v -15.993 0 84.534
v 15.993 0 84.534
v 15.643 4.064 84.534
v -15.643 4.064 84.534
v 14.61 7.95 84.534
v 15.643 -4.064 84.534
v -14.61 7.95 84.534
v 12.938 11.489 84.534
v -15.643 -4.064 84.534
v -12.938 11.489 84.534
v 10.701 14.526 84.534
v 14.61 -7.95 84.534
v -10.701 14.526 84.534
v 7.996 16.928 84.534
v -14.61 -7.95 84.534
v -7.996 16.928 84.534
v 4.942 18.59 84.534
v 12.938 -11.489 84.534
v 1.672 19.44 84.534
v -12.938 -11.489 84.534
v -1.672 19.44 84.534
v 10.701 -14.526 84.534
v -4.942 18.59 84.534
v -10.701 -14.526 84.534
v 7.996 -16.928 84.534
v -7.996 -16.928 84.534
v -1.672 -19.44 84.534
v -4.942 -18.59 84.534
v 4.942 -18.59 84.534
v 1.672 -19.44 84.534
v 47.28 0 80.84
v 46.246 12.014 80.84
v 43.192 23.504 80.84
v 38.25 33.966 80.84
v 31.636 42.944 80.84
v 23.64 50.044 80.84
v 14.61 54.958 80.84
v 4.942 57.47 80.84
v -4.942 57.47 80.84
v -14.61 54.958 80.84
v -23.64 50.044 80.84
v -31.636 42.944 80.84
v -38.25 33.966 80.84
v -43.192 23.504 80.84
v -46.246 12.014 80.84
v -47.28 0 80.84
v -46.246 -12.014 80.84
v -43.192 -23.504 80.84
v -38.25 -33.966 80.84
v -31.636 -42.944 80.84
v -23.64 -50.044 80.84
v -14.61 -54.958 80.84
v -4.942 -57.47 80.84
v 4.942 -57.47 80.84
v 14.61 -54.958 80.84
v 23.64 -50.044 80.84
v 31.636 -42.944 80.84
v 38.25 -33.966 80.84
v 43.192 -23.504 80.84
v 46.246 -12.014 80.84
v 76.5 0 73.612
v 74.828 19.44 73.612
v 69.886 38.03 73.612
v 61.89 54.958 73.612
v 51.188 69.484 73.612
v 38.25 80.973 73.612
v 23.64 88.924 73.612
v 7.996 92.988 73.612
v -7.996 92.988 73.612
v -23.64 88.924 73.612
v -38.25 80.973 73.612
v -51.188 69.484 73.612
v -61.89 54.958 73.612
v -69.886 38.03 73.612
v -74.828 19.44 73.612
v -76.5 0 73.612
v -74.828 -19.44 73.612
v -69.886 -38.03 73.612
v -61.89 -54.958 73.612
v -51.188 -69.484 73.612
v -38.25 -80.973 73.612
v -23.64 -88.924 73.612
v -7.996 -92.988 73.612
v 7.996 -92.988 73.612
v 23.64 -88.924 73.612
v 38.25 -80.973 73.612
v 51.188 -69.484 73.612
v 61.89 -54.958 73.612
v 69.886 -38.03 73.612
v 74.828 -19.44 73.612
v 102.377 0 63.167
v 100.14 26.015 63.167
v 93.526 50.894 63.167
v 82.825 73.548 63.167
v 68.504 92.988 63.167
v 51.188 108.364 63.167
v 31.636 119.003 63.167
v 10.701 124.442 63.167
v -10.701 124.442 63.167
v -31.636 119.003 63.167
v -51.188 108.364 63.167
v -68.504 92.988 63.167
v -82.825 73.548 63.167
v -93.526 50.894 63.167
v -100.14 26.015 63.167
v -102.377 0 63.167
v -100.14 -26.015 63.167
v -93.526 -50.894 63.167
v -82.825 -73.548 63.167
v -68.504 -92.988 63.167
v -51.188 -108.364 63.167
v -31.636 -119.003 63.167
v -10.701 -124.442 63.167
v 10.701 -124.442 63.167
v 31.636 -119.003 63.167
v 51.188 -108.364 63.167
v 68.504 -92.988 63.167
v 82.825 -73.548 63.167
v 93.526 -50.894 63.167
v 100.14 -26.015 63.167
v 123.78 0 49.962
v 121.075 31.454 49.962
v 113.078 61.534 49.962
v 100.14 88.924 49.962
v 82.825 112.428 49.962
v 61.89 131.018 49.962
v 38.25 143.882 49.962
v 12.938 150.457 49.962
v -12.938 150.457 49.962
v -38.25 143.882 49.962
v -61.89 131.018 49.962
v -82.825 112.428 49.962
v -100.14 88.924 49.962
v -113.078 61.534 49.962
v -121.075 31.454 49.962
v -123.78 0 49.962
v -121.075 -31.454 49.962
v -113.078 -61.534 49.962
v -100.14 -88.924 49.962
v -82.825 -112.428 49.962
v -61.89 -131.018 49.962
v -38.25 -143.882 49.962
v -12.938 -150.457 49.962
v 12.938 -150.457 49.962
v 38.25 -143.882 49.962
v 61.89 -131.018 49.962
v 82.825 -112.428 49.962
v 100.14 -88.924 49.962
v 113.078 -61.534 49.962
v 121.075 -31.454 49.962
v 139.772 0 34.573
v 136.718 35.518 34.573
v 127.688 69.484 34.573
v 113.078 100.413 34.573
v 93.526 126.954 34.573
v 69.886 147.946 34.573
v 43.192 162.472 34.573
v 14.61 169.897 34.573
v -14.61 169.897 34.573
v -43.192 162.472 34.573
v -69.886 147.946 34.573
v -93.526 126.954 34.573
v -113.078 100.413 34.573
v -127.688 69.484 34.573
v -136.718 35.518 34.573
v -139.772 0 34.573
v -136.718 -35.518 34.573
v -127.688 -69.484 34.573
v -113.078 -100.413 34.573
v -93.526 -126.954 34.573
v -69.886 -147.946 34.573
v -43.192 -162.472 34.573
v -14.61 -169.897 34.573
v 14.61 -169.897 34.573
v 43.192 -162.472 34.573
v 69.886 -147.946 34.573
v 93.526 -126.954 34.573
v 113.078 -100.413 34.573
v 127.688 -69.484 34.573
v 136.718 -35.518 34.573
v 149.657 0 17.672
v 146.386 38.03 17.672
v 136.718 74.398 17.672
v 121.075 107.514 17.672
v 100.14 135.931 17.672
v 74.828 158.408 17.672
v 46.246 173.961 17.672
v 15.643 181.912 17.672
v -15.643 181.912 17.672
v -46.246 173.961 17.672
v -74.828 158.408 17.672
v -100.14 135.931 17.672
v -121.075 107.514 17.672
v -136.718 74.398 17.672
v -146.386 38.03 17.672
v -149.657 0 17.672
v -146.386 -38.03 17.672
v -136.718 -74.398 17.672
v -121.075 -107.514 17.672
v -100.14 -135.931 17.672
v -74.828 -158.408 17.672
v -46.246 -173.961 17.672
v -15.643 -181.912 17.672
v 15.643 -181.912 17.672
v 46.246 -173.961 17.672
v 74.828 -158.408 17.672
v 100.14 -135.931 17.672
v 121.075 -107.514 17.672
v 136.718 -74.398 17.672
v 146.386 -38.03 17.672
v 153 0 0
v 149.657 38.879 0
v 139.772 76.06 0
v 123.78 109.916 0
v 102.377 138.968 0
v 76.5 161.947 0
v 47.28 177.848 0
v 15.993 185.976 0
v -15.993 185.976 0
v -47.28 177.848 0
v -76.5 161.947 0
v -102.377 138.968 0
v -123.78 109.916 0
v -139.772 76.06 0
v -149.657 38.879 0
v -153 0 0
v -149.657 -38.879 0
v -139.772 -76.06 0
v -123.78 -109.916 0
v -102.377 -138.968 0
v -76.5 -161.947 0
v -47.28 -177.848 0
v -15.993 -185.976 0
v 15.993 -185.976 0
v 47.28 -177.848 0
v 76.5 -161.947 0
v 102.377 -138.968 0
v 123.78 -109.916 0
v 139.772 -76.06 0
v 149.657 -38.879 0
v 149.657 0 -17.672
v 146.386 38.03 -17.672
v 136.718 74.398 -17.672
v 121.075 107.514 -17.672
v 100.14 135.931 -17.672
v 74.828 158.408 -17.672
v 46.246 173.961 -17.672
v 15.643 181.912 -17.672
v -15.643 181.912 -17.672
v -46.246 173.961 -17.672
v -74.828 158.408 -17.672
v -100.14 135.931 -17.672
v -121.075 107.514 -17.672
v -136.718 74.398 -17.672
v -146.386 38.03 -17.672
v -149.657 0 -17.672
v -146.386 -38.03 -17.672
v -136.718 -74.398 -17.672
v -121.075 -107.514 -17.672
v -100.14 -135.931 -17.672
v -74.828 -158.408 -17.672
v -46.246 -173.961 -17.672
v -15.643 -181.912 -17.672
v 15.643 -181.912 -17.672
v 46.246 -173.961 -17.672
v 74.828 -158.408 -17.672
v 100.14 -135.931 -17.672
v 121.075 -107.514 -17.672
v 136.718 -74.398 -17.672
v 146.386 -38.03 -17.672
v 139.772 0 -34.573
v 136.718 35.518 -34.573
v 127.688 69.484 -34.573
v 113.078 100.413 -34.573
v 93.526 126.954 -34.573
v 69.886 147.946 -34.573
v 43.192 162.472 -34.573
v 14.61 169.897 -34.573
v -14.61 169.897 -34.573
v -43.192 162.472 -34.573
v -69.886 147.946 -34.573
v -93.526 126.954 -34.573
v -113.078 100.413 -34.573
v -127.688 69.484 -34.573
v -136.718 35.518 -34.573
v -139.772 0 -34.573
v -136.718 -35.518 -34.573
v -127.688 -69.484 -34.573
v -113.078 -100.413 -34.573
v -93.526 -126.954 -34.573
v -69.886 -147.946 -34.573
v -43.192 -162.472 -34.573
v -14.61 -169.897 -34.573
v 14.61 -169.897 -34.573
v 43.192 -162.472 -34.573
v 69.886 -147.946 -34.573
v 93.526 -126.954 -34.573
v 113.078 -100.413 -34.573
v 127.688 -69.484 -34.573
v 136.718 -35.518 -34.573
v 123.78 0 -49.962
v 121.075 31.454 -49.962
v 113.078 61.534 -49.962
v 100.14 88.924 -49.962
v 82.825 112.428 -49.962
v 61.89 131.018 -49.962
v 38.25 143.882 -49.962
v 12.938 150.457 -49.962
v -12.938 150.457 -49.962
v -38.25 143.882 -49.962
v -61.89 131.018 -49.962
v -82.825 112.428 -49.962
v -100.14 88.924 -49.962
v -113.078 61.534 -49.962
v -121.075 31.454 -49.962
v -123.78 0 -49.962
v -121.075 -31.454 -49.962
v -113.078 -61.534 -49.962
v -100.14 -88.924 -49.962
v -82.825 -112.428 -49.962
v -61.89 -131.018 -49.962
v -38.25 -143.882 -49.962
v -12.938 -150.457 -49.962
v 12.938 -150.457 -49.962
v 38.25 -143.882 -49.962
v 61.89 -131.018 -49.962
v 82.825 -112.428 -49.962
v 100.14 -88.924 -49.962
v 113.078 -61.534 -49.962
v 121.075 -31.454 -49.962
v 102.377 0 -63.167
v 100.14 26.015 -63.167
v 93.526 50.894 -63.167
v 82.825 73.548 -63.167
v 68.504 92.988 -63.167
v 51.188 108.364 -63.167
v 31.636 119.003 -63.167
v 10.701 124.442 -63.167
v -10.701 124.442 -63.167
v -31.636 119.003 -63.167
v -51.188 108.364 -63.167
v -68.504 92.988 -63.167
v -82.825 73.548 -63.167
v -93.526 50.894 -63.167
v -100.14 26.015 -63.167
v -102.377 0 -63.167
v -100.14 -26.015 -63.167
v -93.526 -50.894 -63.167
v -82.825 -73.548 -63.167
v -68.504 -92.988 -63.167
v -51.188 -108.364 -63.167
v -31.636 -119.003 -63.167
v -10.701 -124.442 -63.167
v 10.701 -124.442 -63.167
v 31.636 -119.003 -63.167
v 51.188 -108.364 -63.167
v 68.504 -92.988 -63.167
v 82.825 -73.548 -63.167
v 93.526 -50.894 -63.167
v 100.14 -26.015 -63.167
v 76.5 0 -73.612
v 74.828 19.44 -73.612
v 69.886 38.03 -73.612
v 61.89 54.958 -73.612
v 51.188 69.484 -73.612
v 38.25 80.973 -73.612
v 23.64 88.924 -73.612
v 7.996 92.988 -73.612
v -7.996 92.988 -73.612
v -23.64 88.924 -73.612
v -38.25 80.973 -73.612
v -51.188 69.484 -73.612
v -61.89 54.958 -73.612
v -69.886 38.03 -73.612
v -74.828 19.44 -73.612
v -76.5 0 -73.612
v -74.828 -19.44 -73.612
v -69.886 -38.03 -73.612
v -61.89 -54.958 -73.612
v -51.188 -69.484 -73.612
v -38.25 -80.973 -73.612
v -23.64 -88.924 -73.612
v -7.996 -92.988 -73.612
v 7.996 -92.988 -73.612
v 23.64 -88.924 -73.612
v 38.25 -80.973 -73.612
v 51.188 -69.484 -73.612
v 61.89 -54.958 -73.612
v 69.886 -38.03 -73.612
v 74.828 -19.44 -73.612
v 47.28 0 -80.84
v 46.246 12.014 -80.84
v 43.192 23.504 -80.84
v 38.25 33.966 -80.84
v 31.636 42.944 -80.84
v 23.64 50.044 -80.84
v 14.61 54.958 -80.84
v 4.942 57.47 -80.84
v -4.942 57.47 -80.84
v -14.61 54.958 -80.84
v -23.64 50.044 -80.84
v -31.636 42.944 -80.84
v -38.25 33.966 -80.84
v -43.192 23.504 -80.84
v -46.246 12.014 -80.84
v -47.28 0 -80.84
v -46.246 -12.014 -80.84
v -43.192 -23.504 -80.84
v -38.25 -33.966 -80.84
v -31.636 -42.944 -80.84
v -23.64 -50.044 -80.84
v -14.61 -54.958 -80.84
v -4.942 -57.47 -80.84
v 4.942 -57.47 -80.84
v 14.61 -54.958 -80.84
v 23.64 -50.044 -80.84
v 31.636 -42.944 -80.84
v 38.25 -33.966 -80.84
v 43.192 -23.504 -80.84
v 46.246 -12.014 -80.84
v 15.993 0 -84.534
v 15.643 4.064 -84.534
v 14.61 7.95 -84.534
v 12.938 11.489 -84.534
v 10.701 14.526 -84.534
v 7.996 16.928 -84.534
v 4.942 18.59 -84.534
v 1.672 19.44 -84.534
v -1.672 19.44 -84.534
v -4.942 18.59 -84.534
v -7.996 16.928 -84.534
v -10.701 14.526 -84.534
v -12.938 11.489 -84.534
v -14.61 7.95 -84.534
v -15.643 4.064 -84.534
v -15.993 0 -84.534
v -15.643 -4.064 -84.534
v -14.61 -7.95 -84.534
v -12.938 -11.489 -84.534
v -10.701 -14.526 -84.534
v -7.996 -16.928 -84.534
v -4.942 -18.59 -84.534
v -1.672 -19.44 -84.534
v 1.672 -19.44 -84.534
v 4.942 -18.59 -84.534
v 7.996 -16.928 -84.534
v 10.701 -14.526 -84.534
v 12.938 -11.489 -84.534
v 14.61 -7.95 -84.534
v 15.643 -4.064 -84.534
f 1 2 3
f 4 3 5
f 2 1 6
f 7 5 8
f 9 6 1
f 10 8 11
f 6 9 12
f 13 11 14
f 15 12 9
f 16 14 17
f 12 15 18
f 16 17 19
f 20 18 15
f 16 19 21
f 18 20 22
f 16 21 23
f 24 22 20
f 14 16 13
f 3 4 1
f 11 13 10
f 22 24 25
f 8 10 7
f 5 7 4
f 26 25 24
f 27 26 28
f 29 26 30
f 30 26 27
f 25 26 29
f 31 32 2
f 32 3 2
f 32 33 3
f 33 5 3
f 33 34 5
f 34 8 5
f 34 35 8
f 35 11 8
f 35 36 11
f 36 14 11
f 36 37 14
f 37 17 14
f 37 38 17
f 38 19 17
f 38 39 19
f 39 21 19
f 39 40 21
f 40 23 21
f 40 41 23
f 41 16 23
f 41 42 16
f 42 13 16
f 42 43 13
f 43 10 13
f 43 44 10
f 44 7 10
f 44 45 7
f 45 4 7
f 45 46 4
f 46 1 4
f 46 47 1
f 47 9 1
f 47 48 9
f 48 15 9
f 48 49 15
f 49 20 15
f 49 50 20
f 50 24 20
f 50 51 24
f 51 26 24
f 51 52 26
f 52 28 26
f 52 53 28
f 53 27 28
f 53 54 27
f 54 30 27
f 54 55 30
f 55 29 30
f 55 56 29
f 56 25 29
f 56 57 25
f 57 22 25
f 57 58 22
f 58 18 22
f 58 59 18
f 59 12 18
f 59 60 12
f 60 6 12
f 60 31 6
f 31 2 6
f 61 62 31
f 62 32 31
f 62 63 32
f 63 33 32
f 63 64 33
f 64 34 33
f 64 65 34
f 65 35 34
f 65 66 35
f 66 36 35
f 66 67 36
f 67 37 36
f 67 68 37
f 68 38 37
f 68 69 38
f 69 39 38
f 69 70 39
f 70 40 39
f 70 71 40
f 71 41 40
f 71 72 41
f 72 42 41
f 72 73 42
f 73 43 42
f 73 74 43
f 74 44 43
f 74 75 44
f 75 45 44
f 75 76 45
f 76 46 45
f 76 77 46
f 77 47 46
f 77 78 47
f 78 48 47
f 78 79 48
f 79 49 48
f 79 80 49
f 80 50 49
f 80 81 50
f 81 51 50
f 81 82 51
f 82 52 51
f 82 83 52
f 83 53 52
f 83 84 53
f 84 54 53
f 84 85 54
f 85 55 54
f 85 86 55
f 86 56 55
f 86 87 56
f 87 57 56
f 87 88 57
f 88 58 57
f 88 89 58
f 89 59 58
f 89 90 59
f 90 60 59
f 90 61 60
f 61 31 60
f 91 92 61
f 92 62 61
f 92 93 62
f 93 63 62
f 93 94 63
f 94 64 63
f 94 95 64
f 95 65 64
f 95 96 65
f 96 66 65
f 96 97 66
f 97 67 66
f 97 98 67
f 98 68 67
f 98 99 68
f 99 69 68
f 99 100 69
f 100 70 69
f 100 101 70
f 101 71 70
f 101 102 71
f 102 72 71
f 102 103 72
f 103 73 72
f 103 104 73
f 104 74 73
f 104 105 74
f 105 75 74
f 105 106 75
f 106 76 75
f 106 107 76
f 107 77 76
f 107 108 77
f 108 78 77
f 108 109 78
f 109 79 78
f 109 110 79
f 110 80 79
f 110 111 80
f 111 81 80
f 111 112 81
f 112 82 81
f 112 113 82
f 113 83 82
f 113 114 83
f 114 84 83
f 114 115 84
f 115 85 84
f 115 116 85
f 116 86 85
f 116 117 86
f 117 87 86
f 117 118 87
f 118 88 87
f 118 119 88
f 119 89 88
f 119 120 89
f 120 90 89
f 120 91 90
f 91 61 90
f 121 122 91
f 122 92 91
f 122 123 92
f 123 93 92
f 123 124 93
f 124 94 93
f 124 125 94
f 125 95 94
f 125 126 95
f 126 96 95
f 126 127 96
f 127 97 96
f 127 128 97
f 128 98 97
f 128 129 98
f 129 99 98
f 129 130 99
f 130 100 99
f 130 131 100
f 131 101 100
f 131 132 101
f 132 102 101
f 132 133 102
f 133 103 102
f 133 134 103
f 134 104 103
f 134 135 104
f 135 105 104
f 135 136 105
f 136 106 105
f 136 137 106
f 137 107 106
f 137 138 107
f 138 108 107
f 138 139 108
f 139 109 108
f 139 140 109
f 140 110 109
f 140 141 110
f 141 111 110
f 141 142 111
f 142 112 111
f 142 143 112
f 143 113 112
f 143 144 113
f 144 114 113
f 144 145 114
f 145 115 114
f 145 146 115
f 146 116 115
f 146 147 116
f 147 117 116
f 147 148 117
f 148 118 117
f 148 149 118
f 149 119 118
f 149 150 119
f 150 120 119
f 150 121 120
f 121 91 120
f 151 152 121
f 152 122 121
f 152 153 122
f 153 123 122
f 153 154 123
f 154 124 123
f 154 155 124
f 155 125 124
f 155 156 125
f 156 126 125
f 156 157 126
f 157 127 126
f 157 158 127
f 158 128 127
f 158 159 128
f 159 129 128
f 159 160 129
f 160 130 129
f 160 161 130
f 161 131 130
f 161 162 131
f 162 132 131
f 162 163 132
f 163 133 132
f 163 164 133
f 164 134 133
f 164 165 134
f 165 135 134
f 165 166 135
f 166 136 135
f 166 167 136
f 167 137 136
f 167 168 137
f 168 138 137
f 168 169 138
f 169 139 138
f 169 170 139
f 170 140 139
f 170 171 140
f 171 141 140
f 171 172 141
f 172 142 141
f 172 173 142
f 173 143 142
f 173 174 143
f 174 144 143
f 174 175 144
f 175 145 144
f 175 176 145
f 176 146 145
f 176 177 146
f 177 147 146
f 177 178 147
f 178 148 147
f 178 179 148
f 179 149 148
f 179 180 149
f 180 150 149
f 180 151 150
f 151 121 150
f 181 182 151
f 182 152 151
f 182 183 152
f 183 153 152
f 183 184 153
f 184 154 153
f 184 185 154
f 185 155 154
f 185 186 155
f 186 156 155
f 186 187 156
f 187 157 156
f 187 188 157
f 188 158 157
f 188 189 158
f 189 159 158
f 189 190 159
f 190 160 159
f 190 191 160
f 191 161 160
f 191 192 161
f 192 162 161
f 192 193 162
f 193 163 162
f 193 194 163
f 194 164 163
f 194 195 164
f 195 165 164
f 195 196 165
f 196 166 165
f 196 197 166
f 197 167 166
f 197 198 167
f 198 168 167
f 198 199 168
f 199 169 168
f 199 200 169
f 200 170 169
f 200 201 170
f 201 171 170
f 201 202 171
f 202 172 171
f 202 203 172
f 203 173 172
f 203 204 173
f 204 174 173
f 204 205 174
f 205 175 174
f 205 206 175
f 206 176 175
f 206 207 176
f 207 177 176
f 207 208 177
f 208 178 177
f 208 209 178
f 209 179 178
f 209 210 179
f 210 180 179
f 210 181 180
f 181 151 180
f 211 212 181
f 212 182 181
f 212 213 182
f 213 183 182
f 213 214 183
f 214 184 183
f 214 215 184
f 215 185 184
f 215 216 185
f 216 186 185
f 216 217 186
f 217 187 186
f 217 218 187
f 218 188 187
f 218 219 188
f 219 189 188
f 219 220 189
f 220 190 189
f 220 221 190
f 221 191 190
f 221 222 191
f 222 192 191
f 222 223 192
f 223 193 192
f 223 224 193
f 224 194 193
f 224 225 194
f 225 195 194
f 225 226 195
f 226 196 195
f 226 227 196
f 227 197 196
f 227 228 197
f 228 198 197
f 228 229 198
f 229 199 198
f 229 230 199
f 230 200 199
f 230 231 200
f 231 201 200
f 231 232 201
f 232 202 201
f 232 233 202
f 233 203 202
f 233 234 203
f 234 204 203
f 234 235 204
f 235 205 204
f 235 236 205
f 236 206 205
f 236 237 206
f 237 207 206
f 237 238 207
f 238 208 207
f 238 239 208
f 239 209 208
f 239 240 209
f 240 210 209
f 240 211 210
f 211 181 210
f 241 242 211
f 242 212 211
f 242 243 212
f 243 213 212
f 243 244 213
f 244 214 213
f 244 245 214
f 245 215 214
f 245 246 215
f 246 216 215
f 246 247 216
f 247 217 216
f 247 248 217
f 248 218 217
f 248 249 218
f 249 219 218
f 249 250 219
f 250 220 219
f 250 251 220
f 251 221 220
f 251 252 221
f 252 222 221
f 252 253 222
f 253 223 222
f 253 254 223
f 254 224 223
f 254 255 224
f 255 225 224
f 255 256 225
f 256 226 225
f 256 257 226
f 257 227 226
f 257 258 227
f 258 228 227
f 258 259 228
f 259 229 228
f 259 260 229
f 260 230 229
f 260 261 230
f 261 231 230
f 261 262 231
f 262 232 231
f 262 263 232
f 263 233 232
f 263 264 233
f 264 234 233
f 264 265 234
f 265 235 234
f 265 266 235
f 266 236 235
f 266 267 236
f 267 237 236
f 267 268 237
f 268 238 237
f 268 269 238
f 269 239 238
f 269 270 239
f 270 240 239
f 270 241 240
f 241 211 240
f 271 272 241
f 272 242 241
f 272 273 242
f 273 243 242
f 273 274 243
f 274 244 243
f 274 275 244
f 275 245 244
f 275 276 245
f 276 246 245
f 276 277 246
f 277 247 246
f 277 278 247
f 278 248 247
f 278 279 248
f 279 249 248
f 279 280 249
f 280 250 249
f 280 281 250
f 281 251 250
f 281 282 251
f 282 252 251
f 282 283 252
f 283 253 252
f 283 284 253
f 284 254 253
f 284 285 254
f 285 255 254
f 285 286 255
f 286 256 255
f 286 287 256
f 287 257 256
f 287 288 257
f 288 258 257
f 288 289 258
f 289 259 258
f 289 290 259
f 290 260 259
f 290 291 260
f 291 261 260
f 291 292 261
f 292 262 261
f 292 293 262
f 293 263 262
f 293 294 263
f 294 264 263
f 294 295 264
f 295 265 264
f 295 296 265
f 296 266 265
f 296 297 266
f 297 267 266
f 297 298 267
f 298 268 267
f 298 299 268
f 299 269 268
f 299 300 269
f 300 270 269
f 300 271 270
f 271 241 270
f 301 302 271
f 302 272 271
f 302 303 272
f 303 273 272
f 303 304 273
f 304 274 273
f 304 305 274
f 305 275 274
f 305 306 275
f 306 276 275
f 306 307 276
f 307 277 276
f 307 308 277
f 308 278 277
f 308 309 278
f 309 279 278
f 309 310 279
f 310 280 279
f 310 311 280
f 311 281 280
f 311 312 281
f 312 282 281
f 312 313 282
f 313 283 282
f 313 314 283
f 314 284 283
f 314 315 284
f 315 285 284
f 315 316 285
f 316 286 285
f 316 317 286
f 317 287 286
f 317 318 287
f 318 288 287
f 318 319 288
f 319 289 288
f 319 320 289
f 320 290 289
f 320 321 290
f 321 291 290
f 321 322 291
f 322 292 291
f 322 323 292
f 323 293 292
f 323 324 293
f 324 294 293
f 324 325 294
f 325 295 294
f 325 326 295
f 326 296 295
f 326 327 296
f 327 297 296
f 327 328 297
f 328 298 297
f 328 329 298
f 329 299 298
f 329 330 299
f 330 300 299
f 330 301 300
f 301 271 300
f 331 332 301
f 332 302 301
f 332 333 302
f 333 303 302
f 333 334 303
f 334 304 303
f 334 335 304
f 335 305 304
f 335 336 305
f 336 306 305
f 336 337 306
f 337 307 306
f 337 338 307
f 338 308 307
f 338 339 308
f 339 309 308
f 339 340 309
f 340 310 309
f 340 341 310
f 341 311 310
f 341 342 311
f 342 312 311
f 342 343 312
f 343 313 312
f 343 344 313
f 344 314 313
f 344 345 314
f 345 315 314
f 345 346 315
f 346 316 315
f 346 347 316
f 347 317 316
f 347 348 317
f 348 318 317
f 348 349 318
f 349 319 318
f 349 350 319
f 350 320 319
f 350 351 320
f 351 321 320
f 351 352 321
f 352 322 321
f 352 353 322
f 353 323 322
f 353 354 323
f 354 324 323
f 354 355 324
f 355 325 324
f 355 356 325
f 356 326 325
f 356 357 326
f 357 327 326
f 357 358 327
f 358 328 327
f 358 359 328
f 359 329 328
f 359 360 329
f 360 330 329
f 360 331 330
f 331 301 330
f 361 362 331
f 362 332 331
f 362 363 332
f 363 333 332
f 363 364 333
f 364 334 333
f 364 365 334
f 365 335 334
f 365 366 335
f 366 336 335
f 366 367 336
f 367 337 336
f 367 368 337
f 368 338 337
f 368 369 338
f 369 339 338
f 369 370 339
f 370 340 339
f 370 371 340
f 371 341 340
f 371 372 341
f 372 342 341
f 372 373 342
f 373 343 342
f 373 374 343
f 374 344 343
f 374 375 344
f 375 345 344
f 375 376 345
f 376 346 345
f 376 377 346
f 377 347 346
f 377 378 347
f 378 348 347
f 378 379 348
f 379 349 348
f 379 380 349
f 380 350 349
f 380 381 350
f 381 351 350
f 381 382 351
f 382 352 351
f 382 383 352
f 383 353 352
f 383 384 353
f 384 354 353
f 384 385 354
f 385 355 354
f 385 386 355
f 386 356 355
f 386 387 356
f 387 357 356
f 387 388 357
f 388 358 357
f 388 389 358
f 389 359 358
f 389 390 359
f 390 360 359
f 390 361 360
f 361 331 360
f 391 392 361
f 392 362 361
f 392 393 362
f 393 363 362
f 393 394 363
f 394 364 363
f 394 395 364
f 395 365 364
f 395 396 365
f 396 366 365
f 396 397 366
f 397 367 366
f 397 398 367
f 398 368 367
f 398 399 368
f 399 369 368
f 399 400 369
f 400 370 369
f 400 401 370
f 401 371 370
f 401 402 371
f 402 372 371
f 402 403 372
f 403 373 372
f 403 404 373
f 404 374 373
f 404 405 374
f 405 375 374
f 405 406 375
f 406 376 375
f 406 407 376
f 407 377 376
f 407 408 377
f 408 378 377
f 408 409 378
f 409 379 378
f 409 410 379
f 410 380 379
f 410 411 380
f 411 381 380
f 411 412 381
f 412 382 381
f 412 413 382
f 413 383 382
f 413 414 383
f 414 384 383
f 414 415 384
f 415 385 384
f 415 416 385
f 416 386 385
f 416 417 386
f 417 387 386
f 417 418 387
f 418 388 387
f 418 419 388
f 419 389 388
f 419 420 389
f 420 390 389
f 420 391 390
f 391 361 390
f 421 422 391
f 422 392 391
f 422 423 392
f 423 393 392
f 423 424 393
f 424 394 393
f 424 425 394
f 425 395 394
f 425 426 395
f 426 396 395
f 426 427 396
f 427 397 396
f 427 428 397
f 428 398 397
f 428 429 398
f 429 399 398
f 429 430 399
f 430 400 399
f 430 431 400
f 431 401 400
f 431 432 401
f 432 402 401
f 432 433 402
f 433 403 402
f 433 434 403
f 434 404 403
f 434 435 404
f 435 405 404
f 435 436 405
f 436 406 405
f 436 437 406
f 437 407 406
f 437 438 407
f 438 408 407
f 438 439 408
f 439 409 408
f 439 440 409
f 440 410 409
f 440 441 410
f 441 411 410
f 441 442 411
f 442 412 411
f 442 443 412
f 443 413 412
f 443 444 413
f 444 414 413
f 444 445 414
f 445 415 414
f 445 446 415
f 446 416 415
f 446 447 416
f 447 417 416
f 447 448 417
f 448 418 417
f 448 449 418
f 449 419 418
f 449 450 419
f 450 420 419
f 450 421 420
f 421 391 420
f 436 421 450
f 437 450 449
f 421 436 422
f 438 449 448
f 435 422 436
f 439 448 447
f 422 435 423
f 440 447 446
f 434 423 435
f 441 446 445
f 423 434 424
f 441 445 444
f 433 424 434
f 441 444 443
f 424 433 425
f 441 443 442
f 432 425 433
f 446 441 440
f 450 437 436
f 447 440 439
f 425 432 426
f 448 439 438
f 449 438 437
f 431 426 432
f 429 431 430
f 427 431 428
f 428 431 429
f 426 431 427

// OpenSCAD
// Generated by SolidPython 1.0.1 on 2020-07-29 00:46:48


scale(v = [9, 11, 5]) {
	sphere(r = 17);
}
/***********************************************
*********      SolidPython code:      **********
************************************************
 
# import packages: SolidPython
from solid import *
from solid.utils import *
from itertools import chain, combinations, permutations


class Resize:

    def __init__(self, scad_file):
        self.scad_file = scad_file
        #self.scad_file = import_scad(scad_file)
        # cone/cylinder param:
        self.r1 = 0
        self.r2 = 0
        self.h = 0
        # rectangular prism param:
        self.w = 0
        self.l = 0
        # ellipse param:
        self.r = 0

    # import OpenScad code (file name corresponds to shape)


    # classify shape + parameters
    def assign(self, param1, param2, param3):
        if self.scad_file == 'cone.scad':
            self.r1 = param1
            self.r2 = param2
            self.h = param3
        elif self.scad_file == 'cylinder.scad':
            self.r1 = param1
            self.r2 = param2
            self.h = param3
        elif self.scad_file == 'rectangularPrism.scad':
            self.h = param1
            self.l = param2
            self.w = param3
        else:
            self.r = param1
            self.h = param2

    # resize parameters
    def iterate(self):
        x = range(3, 20, 2)
        i = 1
        if self.scad_file == 'cone.scad':
            tempList = list(permutations(x, 2))
            for temp in tempList:
                param1 = temp[0]
                param2 = temp[1]
                filepath = 'produced_scad_files/' + 'cone' + str(param1) + '_' + str(param2) + '_' + '.scad'
                scad_render_to_file(cylinder(h=param1, r1=param2, r2=0), filepath)

        elif self.scad_file == 'cylinder.scad':
            tempList = list(permutations(x, 3))
            for temp in tempList:
                param1 = temp[0]
                param2 = temp[1]
                filepath = 'produced_scad_files/' + 'cylinder' + str(param1) + '_' + str(param2) + '_' + '.scad'
                scad_render_to_file(cylinder(h=param1, r1=param2, r2=param2), filepath)

        elif self.scad_file == 'rectangularPrism.scad':
            tempList = list(permutations(x, 3))
            for temp in tempList:
                param1 = temp[0]
                param2 = temp[1]
                param3 = temp[2]
                filepath = 'produced_scad_files/' + 'rectangularPrism' + str(param1) + '_' + str(param2) + '_' + str(
                    param3) + '.scad'
                scad_render_to_file(cube(size=(param1, param2, param3)), filepath)

        elif self.scad_file == 'ellipse.scad':
            tempList = list(permutations(x, 4))
            for temp in tempList:
                param1 = temp[0]
                param2 = temp[1]
                param3 = temp[2]
                param4 = temp[3]
                filepath = 'produced_scad_files/' + 'ellipse' + str(param1) + '_' + str(param2) + '_' + str(param3) + '_' + str(param4) + '.scad'
                scad_render_to_file(scale([param1, param2, param3])(sphere(r=param4)), filepath)

    def render_to_scadfile(self):
        scad_render_to_file(scad, 'example.scad') 
 
************************************************/
